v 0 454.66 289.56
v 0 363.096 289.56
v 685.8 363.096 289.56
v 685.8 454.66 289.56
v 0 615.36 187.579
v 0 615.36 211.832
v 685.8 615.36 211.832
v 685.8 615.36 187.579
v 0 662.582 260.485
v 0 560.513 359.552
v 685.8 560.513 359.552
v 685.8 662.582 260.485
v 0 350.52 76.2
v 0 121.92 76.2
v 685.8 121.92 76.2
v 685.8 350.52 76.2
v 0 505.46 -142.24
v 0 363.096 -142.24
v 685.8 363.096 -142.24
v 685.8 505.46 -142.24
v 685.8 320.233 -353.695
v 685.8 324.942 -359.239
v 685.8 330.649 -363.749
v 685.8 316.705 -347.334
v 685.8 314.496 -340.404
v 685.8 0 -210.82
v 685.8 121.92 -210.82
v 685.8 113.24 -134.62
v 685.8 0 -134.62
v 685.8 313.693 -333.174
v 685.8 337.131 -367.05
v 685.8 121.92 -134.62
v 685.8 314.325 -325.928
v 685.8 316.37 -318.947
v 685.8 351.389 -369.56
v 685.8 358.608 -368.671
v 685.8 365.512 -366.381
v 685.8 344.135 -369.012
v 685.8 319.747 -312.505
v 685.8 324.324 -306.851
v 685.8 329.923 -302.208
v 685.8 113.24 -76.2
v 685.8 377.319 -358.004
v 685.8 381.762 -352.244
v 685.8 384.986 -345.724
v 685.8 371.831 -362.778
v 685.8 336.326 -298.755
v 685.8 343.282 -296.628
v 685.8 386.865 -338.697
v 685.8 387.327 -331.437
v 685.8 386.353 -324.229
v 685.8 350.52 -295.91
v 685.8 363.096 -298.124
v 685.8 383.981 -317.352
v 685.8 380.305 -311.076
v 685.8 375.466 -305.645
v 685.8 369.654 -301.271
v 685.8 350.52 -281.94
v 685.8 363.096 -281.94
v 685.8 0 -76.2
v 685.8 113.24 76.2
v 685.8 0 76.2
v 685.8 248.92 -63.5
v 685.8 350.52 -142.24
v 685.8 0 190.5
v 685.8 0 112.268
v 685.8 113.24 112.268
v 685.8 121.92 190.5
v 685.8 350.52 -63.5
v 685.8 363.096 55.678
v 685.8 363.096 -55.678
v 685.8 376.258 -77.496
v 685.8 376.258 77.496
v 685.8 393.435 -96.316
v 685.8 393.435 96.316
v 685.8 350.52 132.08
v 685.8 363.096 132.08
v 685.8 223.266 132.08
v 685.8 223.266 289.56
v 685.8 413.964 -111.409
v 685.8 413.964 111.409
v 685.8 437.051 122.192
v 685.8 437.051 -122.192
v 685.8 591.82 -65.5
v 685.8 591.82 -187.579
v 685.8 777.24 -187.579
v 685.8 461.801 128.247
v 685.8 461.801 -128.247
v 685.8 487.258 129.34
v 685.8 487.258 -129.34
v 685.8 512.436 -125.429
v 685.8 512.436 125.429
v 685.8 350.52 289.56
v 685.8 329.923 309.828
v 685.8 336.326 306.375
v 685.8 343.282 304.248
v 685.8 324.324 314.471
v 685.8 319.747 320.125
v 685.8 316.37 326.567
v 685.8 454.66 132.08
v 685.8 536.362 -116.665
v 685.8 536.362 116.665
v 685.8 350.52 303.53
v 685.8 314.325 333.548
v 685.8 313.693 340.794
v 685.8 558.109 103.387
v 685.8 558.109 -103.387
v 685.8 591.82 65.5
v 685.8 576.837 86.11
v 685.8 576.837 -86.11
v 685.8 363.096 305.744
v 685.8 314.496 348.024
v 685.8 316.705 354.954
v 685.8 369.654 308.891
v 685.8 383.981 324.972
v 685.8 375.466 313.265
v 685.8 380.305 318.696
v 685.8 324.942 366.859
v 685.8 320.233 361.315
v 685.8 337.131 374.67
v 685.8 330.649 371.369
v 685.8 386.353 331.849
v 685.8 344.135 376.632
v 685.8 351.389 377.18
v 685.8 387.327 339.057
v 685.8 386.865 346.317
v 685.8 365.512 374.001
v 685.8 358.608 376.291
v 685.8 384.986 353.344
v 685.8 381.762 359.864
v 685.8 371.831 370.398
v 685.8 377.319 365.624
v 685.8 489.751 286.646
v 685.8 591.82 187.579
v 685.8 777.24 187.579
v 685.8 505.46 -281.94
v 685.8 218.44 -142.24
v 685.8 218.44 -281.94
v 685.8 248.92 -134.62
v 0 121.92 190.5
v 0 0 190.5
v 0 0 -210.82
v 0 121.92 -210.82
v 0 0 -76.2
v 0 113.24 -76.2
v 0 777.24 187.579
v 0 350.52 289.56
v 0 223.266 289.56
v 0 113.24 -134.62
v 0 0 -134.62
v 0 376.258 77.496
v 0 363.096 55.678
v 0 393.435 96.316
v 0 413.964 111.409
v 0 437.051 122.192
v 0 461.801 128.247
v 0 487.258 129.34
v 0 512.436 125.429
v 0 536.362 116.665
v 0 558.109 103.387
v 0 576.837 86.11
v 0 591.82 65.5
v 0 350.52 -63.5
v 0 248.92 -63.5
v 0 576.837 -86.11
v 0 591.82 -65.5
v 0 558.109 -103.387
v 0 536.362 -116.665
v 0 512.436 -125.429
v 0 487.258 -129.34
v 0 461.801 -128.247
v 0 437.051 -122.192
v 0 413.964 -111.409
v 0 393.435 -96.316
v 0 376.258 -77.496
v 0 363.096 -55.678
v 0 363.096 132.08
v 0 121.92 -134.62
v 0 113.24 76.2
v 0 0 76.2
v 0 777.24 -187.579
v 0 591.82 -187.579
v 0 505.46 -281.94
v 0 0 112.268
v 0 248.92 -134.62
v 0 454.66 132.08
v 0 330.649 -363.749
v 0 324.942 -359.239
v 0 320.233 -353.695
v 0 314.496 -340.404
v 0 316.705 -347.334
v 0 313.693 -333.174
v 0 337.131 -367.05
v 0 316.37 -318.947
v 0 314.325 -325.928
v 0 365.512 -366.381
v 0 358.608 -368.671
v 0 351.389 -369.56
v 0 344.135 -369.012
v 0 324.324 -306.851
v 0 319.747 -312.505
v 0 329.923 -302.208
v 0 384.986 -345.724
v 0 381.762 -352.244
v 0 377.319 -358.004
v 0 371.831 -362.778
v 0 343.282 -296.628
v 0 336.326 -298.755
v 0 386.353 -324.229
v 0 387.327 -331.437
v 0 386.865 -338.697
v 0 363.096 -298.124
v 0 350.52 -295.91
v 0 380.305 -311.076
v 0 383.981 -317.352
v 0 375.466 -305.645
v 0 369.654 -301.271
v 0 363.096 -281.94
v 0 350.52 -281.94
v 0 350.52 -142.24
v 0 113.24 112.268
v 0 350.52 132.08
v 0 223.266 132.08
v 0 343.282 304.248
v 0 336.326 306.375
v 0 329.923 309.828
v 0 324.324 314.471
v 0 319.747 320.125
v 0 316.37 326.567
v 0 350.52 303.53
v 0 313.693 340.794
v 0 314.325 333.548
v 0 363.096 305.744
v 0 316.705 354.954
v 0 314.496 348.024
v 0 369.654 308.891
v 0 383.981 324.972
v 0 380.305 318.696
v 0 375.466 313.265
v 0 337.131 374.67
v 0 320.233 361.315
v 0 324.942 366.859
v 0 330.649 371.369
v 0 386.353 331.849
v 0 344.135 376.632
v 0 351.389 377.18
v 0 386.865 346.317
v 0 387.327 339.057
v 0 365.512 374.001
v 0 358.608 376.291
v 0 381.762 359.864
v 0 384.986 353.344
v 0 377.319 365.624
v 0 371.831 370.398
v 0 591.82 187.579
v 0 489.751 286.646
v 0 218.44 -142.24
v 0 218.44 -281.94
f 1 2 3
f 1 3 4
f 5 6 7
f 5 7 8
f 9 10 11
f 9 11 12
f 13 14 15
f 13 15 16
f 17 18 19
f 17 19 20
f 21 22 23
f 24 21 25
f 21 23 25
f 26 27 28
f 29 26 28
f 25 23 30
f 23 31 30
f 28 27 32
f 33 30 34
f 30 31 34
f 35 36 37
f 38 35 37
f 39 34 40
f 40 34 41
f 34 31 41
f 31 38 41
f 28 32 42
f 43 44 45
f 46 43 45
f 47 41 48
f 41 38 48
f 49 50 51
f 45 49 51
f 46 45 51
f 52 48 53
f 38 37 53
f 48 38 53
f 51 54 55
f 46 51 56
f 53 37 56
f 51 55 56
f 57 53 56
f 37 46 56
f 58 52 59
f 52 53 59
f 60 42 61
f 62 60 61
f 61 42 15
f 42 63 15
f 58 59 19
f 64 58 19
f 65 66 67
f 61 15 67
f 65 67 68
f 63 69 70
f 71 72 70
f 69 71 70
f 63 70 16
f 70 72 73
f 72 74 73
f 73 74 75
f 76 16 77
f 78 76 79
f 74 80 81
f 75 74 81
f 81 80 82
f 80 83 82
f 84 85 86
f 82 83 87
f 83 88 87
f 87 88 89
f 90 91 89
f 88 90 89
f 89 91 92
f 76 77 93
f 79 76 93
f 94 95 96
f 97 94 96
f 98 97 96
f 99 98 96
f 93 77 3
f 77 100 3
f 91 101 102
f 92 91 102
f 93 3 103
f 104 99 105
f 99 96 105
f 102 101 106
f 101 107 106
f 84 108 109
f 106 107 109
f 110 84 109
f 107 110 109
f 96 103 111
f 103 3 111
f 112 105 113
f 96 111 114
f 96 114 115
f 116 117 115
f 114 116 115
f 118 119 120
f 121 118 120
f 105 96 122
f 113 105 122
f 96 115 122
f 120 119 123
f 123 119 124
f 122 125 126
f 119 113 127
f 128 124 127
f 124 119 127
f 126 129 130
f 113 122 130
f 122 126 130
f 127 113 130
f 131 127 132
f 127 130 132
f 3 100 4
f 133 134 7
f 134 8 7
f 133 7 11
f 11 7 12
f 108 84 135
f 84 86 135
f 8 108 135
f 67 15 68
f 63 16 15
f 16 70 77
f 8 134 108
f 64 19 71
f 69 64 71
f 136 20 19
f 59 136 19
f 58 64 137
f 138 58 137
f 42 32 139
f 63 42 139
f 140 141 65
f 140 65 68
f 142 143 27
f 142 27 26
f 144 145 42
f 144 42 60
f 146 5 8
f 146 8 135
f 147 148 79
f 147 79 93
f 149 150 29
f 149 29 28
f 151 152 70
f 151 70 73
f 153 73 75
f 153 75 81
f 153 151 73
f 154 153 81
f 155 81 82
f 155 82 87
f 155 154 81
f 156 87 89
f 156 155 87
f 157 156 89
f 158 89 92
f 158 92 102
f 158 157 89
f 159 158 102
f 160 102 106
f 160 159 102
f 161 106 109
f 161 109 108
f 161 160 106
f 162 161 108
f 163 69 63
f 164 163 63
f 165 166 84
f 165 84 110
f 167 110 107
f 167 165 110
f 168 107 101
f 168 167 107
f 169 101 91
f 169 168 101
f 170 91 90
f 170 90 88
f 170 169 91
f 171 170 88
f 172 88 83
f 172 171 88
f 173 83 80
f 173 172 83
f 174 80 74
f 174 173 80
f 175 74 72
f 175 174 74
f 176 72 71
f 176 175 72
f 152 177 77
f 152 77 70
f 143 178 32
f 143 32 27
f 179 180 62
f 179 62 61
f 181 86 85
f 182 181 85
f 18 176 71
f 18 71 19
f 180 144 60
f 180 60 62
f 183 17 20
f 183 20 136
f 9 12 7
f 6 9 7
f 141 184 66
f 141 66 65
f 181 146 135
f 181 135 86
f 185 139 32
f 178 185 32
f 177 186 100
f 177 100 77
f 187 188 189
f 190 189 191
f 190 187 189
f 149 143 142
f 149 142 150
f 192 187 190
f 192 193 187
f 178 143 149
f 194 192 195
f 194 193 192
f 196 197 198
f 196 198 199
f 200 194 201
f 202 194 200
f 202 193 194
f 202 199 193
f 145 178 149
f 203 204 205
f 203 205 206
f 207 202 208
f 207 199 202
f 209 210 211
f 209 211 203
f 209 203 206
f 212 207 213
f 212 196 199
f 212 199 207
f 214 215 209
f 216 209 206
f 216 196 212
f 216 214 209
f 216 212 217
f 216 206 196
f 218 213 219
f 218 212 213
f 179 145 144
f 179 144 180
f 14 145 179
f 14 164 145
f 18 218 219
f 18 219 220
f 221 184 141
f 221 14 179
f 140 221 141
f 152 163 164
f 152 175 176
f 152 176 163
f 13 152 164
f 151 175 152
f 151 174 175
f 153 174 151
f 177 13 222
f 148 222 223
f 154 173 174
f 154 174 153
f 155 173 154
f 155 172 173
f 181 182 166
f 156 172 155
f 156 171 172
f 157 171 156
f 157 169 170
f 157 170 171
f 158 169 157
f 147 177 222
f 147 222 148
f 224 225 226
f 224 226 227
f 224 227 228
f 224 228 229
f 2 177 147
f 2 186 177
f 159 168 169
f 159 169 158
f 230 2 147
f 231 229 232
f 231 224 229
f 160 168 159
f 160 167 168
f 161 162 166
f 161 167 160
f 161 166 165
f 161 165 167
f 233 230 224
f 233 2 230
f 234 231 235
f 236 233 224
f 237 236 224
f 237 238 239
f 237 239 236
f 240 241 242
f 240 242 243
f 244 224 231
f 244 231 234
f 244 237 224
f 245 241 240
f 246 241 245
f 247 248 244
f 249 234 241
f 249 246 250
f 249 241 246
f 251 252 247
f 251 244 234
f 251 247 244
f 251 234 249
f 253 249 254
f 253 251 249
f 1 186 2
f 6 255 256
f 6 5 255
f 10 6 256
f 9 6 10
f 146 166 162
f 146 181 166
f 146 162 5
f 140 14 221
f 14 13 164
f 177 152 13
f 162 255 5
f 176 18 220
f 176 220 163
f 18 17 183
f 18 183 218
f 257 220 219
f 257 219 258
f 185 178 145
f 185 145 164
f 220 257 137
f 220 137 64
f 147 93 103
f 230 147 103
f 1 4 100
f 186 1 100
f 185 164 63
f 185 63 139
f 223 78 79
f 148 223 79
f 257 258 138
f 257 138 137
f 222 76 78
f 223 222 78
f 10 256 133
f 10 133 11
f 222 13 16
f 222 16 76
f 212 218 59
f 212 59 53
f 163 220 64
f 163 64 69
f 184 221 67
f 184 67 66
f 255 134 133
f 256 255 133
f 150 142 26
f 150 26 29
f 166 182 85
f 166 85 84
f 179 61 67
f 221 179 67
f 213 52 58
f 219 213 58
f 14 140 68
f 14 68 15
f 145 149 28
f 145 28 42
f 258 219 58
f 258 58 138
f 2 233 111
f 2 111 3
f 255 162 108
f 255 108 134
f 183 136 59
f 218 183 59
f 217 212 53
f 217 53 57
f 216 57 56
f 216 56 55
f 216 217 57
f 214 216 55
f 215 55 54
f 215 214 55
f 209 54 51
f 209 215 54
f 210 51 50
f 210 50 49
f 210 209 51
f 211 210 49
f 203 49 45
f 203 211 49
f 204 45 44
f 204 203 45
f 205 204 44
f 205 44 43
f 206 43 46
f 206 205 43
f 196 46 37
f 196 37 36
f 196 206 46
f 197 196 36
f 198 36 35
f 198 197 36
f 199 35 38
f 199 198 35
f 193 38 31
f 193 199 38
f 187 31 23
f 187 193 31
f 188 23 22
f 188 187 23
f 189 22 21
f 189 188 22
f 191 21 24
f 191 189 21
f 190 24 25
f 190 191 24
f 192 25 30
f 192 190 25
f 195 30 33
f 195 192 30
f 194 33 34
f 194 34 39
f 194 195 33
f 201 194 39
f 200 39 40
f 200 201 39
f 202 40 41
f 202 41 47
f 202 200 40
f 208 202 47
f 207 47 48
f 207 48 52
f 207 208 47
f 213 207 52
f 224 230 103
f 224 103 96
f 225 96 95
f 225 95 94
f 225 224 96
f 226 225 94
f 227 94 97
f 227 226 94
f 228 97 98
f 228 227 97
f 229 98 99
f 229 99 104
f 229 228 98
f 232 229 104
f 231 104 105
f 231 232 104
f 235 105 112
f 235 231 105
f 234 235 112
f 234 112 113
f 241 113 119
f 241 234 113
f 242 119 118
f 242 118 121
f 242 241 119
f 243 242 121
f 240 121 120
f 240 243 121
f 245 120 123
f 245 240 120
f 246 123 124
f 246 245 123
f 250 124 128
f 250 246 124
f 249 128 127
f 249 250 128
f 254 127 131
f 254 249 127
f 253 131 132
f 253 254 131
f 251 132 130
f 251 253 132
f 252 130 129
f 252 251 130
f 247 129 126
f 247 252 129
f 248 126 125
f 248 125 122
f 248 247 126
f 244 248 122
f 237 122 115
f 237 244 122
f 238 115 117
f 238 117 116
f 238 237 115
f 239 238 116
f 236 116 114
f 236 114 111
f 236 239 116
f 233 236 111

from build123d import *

# Parameters (mm, degrees)
BOSS_EXTRUDE1_DEPTH = 685.8


with BuildPart() as part:
    # Sketch1 → Boss-Extrude1 (new body)
    with BuildSketch(Plane(origin=(0, 0, 0), x_dir=(0, 0, -1), z_dir=(1, 0, 0))):
        with BuildLine():
            Line((-112.268, 0), (-190.5, 0))
            Line((-190.5, 0), (-190.5, 121.92))
            Line((-190.5, 121.92), (-112.268, 121.92))
            Line((-112.268, 121.92), (-76.2, 121.92))
            Line((-76.2, 121.92), (-76.2, 248.92))
            Line((-76.2, 248.92), (-76.2, 350.52))
            Line((-76.2, 350.52), (-132.08, 350.52))
            Line((-132.08, 350.52), (-132.08, 223.266))
            Line((-132.08, 223.266), (-289.56, 223.266))
            Line((-289.56, 223.266), (-289.56, 350.52))
            Line((-289.56, 350.52), (-303.53, 350.52))
            ThreePointArc((-303.53, 350.52), (-376.632349663, 344.135209485), (-305.743714359, 363.096234269))
            Line((-305.743714359, 363.096234269), (-289.56, 363.096234269))
            Line((-289.56, 363.096234269), (-289.56, 454.66))
            Line((-289.56, 454.66), (-132.08, 454.66))
            Line((-132.08, 454.66), (-132.08, 363.096234269))
            Line((-132.08, 363.096234269), (-55.678443819, 363.096234269))
            ThreePointArc((-55.678443819, 363.096234269), (-129.420723475, 474.502308473), (-65.500488548, 591.82))
            Line((-65.500488548, 591.82), (-187.579, 591.82))
            Line((-187.579, 591.82), (-286.645657648, 489.751322423))
            Line((-286.645657648, 489.751322423), (-359.551855918, 560.513220743))
            Line((-359.551855918, 560.513220743), (-260.485198269, 662.58189832))
            Line((-260.485198269, 662.58189832), (-211.832451768, 615.360114952))
            Line((-211.832451768, 615.360114952), (-187.579, 615.360114952))
            Line((-187.579, 615.360114952), (-187.579, 777.24))
            Line((-187.579, 777.24), (187.579, 777.24))
            Line((187.579, 777.24), (187.579, 591.82))
            Line((187.579, 591.82), (65.500488548, 591.82))
            ThreePointArc((65.500488548, 591.82), (129.420723475, 474.502308473), (55.678443819, 363.096234269))
            Line((55.678443819, 363.096234269), (142.24, 363.096234269))
            Line((142.24, 363.096234269), (142.24, 505.46))
            Line((142.24, 505.46), (281.94, 505.46))
            Line((281.94, 505.46), (281.94, 363.096234269))
            Line((281.94, 363.096234269), (298.123714359, 363.096234269))
            ThreePointArc((298.123714359, 363.096234269), (369.012349663, 344.135209485), (295.91, 350.52))
            Line((295.91, 350.52), (281.94, 350.52))
            Line((281.94, 350.52), (281.94, 218.44))
            Line((281.94, 218.44), (142.24, 218.44))
            Line((142.24, 218.44), (142.24, 350.52))
            Line((142.24, 350.52), (63.5, 350.52))
            Line((63.5, 350.52), (63.5, 248.92))
            Line((63.5, 248.92), (134.62, 248.92))
            Line((134.62, 248.92), (134.62, 121.92))
            Line((134.62, 121.92), (210.82, 121.92))
            Line((210.82, 121.92), (210.82, 0))
            Line((210.82, 0), (134.62, 0))
            Line((134.62, 0), (134.62, 113.239883031))
            Line((134.62, 113.239883031), (76.2, 113.239883031))
            Line((76.2, 113.239883031), (76.2, 0))
            Line((76.2, 0), (-76.2, 0))
            Line((-76.2, 0), (-76.2, 113.239883031))
            Line((-76.2, 113.239883031), (-112.268, 113.239883031))
            Line((-112.268, 113.239883031), (-112.268, 0))
        make_face()
    extrude(amount=BOSS_EXTRUDE1_DEPTH)


solid = part.part
